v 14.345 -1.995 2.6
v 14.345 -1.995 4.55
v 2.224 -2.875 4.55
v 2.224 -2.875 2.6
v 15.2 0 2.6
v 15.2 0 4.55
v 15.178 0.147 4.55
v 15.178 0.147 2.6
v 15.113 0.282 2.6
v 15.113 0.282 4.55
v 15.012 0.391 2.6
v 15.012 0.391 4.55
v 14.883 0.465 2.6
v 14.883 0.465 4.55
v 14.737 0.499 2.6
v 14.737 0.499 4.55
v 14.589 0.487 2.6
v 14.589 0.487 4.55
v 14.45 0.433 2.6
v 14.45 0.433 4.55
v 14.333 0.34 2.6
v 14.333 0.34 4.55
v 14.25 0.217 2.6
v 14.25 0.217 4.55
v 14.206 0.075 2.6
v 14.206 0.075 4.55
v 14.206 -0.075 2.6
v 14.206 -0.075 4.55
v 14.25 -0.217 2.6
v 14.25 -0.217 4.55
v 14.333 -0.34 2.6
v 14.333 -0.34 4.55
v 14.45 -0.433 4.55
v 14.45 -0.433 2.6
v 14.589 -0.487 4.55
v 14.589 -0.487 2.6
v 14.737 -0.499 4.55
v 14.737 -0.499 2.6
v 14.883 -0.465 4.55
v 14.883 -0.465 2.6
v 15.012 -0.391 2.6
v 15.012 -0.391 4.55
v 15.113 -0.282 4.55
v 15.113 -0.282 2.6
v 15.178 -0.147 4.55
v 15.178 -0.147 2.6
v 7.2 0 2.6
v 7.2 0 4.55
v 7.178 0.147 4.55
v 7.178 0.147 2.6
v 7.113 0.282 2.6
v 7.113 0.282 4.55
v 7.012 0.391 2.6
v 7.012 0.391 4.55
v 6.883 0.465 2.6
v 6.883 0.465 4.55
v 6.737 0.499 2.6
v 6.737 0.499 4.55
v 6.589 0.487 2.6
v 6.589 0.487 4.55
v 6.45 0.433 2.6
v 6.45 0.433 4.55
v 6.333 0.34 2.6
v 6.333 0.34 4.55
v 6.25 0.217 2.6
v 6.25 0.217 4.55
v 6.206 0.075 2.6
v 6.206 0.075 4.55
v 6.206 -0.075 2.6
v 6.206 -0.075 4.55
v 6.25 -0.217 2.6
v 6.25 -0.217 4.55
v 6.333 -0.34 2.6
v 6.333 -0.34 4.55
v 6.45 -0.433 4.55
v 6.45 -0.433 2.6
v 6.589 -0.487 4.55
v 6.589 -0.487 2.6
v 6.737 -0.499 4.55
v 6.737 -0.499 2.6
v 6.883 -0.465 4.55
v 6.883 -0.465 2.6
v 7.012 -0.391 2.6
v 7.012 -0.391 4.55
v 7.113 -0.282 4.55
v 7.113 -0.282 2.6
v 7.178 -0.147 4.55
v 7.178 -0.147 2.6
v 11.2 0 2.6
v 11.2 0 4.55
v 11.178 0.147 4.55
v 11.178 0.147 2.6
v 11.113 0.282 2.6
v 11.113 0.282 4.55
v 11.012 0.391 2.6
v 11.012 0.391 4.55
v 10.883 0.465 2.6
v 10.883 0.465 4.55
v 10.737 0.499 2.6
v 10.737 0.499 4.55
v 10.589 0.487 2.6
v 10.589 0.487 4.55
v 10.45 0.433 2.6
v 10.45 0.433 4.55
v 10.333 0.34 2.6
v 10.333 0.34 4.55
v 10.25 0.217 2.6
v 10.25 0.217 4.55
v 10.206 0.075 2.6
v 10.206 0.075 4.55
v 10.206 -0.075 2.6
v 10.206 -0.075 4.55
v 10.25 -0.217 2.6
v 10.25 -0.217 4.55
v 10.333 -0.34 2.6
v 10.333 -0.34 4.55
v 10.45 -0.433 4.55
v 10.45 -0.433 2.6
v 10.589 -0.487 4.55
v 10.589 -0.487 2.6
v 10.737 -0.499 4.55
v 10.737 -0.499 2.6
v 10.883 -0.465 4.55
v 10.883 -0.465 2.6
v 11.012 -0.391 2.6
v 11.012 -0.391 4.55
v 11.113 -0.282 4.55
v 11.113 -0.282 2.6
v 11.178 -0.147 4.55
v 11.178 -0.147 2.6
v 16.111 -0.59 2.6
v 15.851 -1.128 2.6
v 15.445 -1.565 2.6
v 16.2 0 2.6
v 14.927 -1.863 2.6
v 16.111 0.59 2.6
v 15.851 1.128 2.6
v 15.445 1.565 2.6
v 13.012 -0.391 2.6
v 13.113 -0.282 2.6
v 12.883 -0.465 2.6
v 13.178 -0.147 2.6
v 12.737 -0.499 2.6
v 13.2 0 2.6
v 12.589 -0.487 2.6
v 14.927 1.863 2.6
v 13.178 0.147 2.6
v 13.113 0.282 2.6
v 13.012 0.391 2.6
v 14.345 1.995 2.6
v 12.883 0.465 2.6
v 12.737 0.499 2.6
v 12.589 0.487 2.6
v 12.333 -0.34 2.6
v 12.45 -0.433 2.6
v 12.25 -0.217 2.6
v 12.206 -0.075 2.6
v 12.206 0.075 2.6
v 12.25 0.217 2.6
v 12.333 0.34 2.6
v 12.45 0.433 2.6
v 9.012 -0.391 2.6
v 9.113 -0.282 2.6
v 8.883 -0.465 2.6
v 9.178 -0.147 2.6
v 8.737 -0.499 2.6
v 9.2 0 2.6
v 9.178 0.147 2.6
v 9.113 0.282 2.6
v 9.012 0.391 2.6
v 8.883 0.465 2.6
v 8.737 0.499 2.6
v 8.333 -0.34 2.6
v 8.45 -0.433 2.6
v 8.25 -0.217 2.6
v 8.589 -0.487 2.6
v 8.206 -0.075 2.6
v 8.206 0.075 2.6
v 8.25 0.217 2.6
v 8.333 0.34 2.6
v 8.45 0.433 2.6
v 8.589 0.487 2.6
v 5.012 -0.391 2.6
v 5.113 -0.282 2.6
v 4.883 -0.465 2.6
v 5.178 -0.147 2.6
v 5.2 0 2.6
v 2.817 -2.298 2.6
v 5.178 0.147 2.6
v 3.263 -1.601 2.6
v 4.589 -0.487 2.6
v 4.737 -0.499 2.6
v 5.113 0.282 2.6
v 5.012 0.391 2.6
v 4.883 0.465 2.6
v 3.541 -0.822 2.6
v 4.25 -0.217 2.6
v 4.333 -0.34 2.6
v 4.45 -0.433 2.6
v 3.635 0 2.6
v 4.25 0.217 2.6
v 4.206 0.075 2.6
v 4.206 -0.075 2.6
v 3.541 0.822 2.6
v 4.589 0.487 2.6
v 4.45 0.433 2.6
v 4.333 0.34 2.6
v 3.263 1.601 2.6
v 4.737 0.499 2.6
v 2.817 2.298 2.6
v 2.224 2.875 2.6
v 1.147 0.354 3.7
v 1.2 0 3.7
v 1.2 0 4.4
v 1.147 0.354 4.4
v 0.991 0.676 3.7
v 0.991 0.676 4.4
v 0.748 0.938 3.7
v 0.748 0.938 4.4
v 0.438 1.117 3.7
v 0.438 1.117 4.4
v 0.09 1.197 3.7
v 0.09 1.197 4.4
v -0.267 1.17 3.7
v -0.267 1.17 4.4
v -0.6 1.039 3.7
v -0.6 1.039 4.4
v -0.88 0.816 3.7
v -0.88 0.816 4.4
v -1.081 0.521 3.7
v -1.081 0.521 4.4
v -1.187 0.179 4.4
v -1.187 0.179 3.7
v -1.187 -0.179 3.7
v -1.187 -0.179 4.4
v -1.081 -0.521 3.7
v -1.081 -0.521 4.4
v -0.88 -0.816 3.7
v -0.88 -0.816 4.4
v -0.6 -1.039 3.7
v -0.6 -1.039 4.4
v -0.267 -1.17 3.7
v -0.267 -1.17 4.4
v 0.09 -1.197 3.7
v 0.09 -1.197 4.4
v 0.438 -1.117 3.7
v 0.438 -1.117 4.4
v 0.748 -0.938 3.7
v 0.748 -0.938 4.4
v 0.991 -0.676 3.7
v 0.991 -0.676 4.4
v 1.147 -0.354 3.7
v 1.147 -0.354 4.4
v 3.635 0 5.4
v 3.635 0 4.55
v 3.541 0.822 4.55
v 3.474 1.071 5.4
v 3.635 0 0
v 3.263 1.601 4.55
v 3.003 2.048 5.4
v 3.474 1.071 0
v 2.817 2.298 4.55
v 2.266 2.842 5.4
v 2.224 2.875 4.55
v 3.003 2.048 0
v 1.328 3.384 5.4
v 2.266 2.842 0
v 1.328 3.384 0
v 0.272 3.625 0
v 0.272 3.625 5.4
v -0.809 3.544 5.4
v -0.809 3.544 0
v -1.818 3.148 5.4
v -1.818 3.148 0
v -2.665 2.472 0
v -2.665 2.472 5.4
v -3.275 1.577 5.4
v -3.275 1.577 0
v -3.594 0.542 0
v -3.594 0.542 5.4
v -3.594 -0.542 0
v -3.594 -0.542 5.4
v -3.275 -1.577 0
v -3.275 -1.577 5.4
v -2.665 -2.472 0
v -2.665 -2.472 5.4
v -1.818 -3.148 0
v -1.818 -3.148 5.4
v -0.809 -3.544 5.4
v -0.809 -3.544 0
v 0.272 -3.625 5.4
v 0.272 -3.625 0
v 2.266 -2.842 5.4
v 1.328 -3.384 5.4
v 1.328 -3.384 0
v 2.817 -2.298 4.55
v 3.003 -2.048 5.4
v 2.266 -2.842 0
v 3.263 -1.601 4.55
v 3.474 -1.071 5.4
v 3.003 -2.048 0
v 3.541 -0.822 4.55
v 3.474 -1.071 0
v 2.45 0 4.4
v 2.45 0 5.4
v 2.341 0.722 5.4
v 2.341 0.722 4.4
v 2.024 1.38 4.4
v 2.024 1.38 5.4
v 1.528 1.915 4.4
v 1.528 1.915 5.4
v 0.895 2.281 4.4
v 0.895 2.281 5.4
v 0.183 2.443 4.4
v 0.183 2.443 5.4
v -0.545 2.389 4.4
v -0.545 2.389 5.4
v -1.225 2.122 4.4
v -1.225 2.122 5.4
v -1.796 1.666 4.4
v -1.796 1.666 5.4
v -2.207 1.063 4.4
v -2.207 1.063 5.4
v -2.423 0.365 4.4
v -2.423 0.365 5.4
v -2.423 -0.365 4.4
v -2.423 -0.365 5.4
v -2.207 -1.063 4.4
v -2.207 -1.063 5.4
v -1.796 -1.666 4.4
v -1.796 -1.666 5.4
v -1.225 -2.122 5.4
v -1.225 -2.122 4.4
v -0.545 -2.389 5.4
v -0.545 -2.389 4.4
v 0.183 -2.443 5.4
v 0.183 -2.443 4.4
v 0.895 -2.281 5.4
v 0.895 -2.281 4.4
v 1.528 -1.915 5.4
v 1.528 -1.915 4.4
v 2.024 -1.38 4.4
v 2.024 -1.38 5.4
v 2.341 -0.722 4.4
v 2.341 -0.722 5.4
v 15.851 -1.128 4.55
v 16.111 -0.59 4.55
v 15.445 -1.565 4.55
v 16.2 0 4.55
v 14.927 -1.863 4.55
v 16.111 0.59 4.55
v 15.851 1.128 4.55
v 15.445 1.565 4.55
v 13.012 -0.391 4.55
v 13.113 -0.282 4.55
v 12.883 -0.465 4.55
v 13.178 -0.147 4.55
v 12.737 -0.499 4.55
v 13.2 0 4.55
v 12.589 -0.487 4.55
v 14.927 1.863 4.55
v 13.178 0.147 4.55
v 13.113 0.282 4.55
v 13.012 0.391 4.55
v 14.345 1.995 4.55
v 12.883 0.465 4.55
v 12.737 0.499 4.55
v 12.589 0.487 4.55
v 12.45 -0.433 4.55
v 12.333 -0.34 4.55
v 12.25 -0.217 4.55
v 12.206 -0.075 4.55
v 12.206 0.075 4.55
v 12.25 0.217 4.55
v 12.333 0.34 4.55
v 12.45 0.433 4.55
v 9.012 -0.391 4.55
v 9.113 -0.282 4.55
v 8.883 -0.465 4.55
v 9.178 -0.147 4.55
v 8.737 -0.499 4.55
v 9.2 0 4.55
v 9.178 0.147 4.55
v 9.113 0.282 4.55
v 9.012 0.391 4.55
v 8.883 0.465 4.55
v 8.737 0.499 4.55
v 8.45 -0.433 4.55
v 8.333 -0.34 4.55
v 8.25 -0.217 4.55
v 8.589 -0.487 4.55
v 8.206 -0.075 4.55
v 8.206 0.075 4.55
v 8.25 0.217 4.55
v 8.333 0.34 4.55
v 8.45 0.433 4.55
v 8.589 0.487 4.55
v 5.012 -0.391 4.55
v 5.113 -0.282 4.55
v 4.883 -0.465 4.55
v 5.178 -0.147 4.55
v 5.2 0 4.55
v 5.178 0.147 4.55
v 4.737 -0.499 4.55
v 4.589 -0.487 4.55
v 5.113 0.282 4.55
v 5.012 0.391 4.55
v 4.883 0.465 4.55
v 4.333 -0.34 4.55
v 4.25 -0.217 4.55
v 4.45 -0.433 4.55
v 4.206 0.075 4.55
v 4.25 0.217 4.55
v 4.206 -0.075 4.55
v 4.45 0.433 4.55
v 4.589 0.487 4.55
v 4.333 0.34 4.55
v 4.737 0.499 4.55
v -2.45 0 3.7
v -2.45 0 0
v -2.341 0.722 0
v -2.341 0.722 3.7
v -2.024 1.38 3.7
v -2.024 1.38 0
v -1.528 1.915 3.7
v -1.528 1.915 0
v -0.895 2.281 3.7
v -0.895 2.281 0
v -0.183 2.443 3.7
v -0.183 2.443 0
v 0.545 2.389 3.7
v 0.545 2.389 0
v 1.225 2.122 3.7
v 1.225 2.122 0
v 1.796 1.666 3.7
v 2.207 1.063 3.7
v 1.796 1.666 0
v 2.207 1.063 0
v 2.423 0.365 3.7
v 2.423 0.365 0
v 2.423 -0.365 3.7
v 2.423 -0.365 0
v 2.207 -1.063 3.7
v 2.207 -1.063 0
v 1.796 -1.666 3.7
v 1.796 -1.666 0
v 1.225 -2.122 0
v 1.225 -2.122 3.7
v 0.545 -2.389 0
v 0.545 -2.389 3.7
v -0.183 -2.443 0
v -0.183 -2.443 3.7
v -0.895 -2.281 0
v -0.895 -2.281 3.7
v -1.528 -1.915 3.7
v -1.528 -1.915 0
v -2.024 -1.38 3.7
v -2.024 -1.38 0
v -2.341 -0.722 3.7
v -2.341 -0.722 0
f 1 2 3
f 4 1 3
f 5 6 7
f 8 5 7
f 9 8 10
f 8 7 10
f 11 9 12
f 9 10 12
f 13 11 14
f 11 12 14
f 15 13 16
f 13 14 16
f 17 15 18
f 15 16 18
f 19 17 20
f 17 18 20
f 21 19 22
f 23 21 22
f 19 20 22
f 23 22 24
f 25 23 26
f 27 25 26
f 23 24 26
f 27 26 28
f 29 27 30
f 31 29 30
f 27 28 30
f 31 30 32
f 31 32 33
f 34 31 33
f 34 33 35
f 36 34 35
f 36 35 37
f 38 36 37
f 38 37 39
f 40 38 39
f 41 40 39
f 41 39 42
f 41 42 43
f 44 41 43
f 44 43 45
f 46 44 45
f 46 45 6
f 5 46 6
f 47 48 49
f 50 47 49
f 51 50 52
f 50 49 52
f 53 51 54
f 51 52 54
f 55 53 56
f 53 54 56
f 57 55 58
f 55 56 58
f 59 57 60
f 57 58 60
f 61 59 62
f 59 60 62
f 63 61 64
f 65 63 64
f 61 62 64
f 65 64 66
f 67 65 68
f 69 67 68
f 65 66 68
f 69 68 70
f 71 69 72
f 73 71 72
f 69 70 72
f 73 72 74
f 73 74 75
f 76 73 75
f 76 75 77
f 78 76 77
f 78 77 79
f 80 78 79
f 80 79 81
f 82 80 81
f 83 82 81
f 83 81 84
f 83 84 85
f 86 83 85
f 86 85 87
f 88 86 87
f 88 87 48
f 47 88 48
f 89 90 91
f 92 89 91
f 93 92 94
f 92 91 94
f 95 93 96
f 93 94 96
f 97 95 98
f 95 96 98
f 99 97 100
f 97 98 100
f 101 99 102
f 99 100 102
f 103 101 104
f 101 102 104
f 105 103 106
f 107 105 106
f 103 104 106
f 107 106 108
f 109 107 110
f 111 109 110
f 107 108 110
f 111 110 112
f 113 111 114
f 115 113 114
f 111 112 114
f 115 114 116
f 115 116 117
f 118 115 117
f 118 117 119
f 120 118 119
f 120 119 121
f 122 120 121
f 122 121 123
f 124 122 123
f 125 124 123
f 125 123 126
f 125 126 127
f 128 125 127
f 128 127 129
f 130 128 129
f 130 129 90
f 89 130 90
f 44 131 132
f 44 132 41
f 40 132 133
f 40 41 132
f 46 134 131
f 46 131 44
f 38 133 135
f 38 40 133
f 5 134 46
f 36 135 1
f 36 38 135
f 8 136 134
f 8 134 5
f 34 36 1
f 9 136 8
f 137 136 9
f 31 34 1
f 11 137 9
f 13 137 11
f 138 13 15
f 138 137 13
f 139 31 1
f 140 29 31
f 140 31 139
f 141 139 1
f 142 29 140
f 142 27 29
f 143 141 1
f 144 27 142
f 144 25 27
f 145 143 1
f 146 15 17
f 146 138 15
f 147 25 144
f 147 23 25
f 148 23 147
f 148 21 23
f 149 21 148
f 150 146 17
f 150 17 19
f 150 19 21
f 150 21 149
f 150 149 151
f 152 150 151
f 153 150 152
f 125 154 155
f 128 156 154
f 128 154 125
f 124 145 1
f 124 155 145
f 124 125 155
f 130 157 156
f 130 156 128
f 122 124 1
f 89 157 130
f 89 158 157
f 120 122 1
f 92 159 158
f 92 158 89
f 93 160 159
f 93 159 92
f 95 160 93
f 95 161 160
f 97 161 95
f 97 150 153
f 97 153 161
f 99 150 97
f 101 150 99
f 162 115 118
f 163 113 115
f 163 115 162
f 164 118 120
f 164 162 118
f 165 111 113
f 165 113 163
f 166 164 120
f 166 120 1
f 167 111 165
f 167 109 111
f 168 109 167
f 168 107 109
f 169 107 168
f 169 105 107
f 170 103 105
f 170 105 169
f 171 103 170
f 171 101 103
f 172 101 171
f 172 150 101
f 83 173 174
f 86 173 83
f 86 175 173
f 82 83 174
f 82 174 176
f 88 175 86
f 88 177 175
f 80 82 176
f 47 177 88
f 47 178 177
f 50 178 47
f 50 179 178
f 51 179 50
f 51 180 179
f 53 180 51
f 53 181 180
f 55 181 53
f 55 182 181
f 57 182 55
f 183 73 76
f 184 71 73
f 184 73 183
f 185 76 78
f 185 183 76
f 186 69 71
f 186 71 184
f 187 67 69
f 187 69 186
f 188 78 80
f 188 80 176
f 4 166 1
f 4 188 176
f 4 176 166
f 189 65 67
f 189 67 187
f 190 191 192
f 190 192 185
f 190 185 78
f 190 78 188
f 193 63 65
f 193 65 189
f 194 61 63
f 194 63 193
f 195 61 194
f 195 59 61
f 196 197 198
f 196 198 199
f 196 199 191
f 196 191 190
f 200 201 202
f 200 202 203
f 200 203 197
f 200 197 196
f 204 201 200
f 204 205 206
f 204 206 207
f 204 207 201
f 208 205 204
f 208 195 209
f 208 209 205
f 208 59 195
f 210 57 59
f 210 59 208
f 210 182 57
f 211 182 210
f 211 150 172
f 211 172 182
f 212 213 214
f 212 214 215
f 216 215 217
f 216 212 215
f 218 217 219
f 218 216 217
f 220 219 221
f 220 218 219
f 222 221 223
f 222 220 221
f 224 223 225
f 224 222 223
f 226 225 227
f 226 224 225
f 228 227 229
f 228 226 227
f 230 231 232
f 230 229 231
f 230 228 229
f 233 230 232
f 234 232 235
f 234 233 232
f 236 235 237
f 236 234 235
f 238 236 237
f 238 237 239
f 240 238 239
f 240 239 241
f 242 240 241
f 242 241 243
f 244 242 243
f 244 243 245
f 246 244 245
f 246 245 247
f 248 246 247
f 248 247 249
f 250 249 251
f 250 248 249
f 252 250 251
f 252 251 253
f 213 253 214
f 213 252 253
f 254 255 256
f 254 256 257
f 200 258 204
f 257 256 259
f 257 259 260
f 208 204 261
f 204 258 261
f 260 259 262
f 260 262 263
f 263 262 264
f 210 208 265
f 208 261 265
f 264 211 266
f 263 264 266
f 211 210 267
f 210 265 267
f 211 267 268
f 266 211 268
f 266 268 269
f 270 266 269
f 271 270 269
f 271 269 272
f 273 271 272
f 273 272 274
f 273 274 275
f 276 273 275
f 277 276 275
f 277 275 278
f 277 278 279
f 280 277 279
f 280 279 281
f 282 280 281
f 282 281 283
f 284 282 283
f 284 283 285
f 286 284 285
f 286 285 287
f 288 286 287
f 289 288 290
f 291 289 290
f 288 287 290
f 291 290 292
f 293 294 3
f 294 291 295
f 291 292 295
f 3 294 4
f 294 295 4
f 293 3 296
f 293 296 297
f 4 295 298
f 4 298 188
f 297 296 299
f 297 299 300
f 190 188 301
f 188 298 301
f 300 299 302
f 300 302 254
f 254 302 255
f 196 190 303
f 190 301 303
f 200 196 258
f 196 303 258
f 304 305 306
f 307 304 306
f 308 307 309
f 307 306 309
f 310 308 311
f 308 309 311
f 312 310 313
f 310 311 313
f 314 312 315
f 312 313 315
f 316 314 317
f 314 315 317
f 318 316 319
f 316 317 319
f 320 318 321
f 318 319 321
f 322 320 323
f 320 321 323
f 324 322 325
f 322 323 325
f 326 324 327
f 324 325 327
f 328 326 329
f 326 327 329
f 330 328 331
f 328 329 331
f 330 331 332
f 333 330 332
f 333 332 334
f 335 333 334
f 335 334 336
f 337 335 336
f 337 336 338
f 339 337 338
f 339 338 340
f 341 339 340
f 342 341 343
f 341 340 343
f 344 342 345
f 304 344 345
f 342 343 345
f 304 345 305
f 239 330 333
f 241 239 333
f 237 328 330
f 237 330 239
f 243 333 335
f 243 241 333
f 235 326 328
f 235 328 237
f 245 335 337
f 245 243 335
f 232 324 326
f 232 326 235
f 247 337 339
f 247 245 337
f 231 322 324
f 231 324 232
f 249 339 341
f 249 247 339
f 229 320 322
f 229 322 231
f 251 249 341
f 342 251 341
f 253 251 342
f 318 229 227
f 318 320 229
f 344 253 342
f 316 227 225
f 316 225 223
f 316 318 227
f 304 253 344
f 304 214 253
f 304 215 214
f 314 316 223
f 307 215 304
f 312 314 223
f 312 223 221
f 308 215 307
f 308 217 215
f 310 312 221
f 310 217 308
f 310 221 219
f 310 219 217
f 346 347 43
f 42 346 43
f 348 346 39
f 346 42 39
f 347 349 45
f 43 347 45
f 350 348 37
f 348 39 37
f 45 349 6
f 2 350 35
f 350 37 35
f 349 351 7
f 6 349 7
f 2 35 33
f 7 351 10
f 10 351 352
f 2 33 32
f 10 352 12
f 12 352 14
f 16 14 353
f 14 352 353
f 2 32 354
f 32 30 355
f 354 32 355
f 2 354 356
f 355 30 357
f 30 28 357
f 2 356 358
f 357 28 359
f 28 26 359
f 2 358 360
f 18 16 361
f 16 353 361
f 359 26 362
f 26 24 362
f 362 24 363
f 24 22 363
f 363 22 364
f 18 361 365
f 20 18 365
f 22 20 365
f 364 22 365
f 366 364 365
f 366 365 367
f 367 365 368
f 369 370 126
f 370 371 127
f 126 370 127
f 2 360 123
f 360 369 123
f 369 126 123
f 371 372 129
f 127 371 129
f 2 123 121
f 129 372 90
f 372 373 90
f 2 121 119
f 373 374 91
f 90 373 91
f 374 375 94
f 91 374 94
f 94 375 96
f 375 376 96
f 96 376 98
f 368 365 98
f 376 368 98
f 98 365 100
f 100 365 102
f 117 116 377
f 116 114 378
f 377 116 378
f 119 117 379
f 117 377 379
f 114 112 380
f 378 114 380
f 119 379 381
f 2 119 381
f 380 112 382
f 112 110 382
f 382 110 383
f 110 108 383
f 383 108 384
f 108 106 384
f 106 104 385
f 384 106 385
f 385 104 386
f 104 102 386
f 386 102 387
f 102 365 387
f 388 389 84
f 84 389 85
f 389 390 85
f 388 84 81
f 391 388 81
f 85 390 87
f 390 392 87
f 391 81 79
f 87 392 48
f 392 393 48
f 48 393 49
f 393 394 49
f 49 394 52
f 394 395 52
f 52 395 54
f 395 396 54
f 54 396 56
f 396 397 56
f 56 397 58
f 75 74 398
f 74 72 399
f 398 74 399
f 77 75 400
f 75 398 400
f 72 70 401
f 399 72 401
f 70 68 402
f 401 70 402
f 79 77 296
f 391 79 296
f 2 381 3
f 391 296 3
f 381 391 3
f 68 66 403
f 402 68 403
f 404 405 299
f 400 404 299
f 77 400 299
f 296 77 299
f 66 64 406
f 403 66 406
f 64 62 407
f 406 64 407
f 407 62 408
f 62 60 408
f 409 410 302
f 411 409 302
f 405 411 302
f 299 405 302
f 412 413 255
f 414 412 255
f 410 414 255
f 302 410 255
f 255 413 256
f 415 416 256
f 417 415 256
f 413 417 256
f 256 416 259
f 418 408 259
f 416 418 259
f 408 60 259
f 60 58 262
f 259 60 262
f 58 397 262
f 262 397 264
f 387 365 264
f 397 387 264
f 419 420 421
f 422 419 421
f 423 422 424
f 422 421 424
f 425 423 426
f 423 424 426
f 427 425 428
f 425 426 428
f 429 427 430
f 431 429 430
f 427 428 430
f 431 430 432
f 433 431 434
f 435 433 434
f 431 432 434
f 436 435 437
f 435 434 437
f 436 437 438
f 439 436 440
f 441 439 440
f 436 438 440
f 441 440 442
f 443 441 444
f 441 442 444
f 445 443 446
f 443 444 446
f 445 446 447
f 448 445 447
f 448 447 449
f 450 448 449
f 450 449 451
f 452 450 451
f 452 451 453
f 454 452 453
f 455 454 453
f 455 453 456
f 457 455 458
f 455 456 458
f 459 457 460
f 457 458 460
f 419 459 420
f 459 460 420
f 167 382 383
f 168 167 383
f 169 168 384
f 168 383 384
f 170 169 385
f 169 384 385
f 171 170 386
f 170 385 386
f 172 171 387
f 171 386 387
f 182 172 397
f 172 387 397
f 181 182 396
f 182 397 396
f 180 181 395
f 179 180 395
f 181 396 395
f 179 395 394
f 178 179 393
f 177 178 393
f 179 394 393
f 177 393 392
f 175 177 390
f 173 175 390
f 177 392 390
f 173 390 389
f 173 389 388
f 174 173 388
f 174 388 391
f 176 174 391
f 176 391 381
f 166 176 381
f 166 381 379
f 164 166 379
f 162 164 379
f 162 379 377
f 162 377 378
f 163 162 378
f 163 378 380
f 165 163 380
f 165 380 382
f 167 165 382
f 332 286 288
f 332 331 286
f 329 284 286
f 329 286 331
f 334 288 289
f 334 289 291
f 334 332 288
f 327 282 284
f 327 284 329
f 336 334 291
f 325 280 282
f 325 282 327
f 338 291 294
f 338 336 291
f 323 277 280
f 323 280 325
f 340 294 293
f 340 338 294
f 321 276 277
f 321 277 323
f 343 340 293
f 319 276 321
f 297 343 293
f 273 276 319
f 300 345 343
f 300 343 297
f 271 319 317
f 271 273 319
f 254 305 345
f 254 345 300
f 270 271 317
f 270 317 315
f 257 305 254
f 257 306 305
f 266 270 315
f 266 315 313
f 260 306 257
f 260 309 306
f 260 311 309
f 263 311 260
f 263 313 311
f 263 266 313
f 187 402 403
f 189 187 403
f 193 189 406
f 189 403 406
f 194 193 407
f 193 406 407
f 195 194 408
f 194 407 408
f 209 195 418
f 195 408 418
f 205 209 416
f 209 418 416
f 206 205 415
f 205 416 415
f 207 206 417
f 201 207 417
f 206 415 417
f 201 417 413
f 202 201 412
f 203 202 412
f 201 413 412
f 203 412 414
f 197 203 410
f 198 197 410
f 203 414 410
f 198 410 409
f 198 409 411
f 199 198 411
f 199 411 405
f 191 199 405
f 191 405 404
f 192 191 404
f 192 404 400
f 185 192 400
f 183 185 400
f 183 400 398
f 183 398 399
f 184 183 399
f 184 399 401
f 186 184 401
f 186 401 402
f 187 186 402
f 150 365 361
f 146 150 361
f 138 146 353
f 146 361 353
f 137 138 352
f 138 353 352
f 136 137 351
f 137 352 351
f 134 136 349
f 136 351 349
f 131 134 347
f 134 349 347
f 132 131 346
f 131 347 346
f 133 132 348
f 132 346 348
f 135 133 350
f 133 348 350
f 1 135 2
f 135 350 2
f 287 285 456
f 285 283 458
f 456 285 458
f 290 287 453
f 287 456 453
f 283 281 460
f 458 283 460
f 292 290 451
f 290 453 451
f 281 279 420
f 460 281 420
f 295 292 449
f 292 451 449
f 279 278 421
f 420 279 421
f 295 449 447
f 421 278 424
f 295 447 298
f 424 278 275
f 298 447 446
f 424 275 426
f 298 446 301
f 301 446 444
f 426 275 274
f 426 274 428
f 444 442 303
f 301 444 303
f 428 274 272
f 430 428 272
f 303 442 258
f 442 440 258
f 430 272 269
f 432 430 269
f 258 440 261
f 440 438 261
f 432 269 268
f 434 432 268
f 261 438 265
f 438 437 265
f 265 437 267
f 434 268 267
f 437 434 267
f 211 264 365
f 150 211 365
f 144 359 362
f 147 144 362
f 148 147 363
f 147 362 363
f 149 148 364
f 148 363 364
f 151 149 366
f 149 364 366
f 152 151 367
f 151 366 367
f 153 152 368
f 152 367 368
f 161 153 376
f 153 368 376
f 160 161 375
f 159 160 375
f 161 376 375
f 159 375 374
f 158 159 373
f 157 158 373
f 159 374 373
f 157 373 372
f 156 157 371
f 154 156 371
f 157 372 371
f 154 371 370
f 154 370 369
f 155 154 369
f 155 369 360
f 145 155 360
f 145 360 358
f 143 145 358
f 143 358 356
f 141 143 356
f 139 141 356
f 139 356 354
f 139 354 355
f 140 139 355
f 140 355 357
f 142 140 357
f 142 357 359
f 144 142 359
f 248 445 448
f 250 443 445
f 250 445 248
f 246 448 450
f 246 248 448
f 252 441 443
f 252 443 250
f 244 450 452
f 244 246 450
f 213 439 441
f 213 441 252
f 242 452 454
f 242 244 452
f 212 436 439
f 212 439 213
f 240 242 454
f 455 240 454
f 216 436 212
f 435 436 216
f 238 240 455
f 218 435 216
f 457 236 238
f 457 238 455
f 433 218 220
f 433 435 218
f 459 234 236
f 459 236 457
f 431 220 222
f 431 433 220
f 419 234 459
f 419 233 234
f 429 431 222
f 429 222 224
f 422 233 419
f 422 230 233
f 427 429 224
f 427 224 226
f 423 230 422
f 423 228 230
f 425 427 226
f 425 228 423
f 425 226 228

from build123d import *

# Parameters (mm, degrees)
ESQUISSE1_R             = 3.635
ESQUISSE1_R_2           = 1.2
BOSS_EXTRU_1_DEPTH      = 5.4
BOSS_EXTRU_2_DEPTH      = 1.95
ESQUISSE3_R             = 2.45
ENL_V_MAT_EXTRU_1_DEPTH = 1
ESQUISSE4_R             = 2.45
ENL_V_MAT_EXTRU_2_DEPTH = 3.7
ESQUISSE5_R             = 0.5
ENL_V_MAT_EXTRU_3_DEPTH = 3.7


with BuildPart() as part:
    # Esquisse1 → Boss.-Extru.1 (new body)
    with BuildSketch(Plane.XY):
        Circle(ESQUISSE1_R)
        Circle(ESQUISSE1_R_2, mode=Mode.SUBTRACT)
    extrude(amount=BOSS_EXTRU_1_DEPTH)

    # Esquisse2 → Boss.-Extru.2 (add)
    with BuildSketch(Plane.XY.offset(4.55)):
        with BuildLine():
            Line((2.224320121, 2.875), (14.344868259, 1.994746397))
            ThreePointArc((14.344868259, 1.994746397), (16.2, 0), (14.344868259, -1.994746397))
            Line((14.344868259, -1.994746397), (2.224320121, -2.875))
            ThreePointArc((2.224320121, -2.875), (3.635, 0), (2.224320121, 2.875))
        make_face()
    extrude(amount=-BOSS_EXTRU_2_DEPTH)

    # Esquisse3 → Enlèv. mat.-Extru.1 (cut)
    with BuildSketch(Plane.XY.offset(5.4)):
        Circle(ESQUISSE3_R)
    extrude(amount=-ENL_V_MAT_EXTRU_1_DEPTH, mode=Mode.SUBTRACT)

    # Esquisse4 → Enlèv. mat.-Extru.2 (cut)
    with BuildSketch(Plane(origin=(0, 0, 0), x_dir=(-1, 0, 0), z_dir=(0, 0, -1))):
        Circle(ESQUISSE4_R)
    extrude(amount=-ENL_V_MAT_EXTRU_2_DEPTH, mode=Mode.SUBTRACT)

    # Esquisse5 → Enlèv. mat.-Extru.3 (cut)
    with BuildSketch(Plane.XY.offset(4.55)):
        with Locations((14.7, 0)):
            Circle(ESQUISSE5_R)
        with Locations((12.7, 0)):
            Circle(ESQUISSE5_R)
        with Locations((10.7, 0)):
            Circle(ESQUISSE5_R)
        with Locations((8.7, 0)):
            Circle(ESQUISSE5_R)
        with Locations((6.7, 0)):
            Circle(ESQUISSE5_R)
        with Locations((4.7, 0)):
            Circle(ESQUISSE5_R)
    extrude(amount=-ENL_V_MAT_EXTRU_3_DEPTH, mode=Mode.SUBTRACT)


solid = part.part
